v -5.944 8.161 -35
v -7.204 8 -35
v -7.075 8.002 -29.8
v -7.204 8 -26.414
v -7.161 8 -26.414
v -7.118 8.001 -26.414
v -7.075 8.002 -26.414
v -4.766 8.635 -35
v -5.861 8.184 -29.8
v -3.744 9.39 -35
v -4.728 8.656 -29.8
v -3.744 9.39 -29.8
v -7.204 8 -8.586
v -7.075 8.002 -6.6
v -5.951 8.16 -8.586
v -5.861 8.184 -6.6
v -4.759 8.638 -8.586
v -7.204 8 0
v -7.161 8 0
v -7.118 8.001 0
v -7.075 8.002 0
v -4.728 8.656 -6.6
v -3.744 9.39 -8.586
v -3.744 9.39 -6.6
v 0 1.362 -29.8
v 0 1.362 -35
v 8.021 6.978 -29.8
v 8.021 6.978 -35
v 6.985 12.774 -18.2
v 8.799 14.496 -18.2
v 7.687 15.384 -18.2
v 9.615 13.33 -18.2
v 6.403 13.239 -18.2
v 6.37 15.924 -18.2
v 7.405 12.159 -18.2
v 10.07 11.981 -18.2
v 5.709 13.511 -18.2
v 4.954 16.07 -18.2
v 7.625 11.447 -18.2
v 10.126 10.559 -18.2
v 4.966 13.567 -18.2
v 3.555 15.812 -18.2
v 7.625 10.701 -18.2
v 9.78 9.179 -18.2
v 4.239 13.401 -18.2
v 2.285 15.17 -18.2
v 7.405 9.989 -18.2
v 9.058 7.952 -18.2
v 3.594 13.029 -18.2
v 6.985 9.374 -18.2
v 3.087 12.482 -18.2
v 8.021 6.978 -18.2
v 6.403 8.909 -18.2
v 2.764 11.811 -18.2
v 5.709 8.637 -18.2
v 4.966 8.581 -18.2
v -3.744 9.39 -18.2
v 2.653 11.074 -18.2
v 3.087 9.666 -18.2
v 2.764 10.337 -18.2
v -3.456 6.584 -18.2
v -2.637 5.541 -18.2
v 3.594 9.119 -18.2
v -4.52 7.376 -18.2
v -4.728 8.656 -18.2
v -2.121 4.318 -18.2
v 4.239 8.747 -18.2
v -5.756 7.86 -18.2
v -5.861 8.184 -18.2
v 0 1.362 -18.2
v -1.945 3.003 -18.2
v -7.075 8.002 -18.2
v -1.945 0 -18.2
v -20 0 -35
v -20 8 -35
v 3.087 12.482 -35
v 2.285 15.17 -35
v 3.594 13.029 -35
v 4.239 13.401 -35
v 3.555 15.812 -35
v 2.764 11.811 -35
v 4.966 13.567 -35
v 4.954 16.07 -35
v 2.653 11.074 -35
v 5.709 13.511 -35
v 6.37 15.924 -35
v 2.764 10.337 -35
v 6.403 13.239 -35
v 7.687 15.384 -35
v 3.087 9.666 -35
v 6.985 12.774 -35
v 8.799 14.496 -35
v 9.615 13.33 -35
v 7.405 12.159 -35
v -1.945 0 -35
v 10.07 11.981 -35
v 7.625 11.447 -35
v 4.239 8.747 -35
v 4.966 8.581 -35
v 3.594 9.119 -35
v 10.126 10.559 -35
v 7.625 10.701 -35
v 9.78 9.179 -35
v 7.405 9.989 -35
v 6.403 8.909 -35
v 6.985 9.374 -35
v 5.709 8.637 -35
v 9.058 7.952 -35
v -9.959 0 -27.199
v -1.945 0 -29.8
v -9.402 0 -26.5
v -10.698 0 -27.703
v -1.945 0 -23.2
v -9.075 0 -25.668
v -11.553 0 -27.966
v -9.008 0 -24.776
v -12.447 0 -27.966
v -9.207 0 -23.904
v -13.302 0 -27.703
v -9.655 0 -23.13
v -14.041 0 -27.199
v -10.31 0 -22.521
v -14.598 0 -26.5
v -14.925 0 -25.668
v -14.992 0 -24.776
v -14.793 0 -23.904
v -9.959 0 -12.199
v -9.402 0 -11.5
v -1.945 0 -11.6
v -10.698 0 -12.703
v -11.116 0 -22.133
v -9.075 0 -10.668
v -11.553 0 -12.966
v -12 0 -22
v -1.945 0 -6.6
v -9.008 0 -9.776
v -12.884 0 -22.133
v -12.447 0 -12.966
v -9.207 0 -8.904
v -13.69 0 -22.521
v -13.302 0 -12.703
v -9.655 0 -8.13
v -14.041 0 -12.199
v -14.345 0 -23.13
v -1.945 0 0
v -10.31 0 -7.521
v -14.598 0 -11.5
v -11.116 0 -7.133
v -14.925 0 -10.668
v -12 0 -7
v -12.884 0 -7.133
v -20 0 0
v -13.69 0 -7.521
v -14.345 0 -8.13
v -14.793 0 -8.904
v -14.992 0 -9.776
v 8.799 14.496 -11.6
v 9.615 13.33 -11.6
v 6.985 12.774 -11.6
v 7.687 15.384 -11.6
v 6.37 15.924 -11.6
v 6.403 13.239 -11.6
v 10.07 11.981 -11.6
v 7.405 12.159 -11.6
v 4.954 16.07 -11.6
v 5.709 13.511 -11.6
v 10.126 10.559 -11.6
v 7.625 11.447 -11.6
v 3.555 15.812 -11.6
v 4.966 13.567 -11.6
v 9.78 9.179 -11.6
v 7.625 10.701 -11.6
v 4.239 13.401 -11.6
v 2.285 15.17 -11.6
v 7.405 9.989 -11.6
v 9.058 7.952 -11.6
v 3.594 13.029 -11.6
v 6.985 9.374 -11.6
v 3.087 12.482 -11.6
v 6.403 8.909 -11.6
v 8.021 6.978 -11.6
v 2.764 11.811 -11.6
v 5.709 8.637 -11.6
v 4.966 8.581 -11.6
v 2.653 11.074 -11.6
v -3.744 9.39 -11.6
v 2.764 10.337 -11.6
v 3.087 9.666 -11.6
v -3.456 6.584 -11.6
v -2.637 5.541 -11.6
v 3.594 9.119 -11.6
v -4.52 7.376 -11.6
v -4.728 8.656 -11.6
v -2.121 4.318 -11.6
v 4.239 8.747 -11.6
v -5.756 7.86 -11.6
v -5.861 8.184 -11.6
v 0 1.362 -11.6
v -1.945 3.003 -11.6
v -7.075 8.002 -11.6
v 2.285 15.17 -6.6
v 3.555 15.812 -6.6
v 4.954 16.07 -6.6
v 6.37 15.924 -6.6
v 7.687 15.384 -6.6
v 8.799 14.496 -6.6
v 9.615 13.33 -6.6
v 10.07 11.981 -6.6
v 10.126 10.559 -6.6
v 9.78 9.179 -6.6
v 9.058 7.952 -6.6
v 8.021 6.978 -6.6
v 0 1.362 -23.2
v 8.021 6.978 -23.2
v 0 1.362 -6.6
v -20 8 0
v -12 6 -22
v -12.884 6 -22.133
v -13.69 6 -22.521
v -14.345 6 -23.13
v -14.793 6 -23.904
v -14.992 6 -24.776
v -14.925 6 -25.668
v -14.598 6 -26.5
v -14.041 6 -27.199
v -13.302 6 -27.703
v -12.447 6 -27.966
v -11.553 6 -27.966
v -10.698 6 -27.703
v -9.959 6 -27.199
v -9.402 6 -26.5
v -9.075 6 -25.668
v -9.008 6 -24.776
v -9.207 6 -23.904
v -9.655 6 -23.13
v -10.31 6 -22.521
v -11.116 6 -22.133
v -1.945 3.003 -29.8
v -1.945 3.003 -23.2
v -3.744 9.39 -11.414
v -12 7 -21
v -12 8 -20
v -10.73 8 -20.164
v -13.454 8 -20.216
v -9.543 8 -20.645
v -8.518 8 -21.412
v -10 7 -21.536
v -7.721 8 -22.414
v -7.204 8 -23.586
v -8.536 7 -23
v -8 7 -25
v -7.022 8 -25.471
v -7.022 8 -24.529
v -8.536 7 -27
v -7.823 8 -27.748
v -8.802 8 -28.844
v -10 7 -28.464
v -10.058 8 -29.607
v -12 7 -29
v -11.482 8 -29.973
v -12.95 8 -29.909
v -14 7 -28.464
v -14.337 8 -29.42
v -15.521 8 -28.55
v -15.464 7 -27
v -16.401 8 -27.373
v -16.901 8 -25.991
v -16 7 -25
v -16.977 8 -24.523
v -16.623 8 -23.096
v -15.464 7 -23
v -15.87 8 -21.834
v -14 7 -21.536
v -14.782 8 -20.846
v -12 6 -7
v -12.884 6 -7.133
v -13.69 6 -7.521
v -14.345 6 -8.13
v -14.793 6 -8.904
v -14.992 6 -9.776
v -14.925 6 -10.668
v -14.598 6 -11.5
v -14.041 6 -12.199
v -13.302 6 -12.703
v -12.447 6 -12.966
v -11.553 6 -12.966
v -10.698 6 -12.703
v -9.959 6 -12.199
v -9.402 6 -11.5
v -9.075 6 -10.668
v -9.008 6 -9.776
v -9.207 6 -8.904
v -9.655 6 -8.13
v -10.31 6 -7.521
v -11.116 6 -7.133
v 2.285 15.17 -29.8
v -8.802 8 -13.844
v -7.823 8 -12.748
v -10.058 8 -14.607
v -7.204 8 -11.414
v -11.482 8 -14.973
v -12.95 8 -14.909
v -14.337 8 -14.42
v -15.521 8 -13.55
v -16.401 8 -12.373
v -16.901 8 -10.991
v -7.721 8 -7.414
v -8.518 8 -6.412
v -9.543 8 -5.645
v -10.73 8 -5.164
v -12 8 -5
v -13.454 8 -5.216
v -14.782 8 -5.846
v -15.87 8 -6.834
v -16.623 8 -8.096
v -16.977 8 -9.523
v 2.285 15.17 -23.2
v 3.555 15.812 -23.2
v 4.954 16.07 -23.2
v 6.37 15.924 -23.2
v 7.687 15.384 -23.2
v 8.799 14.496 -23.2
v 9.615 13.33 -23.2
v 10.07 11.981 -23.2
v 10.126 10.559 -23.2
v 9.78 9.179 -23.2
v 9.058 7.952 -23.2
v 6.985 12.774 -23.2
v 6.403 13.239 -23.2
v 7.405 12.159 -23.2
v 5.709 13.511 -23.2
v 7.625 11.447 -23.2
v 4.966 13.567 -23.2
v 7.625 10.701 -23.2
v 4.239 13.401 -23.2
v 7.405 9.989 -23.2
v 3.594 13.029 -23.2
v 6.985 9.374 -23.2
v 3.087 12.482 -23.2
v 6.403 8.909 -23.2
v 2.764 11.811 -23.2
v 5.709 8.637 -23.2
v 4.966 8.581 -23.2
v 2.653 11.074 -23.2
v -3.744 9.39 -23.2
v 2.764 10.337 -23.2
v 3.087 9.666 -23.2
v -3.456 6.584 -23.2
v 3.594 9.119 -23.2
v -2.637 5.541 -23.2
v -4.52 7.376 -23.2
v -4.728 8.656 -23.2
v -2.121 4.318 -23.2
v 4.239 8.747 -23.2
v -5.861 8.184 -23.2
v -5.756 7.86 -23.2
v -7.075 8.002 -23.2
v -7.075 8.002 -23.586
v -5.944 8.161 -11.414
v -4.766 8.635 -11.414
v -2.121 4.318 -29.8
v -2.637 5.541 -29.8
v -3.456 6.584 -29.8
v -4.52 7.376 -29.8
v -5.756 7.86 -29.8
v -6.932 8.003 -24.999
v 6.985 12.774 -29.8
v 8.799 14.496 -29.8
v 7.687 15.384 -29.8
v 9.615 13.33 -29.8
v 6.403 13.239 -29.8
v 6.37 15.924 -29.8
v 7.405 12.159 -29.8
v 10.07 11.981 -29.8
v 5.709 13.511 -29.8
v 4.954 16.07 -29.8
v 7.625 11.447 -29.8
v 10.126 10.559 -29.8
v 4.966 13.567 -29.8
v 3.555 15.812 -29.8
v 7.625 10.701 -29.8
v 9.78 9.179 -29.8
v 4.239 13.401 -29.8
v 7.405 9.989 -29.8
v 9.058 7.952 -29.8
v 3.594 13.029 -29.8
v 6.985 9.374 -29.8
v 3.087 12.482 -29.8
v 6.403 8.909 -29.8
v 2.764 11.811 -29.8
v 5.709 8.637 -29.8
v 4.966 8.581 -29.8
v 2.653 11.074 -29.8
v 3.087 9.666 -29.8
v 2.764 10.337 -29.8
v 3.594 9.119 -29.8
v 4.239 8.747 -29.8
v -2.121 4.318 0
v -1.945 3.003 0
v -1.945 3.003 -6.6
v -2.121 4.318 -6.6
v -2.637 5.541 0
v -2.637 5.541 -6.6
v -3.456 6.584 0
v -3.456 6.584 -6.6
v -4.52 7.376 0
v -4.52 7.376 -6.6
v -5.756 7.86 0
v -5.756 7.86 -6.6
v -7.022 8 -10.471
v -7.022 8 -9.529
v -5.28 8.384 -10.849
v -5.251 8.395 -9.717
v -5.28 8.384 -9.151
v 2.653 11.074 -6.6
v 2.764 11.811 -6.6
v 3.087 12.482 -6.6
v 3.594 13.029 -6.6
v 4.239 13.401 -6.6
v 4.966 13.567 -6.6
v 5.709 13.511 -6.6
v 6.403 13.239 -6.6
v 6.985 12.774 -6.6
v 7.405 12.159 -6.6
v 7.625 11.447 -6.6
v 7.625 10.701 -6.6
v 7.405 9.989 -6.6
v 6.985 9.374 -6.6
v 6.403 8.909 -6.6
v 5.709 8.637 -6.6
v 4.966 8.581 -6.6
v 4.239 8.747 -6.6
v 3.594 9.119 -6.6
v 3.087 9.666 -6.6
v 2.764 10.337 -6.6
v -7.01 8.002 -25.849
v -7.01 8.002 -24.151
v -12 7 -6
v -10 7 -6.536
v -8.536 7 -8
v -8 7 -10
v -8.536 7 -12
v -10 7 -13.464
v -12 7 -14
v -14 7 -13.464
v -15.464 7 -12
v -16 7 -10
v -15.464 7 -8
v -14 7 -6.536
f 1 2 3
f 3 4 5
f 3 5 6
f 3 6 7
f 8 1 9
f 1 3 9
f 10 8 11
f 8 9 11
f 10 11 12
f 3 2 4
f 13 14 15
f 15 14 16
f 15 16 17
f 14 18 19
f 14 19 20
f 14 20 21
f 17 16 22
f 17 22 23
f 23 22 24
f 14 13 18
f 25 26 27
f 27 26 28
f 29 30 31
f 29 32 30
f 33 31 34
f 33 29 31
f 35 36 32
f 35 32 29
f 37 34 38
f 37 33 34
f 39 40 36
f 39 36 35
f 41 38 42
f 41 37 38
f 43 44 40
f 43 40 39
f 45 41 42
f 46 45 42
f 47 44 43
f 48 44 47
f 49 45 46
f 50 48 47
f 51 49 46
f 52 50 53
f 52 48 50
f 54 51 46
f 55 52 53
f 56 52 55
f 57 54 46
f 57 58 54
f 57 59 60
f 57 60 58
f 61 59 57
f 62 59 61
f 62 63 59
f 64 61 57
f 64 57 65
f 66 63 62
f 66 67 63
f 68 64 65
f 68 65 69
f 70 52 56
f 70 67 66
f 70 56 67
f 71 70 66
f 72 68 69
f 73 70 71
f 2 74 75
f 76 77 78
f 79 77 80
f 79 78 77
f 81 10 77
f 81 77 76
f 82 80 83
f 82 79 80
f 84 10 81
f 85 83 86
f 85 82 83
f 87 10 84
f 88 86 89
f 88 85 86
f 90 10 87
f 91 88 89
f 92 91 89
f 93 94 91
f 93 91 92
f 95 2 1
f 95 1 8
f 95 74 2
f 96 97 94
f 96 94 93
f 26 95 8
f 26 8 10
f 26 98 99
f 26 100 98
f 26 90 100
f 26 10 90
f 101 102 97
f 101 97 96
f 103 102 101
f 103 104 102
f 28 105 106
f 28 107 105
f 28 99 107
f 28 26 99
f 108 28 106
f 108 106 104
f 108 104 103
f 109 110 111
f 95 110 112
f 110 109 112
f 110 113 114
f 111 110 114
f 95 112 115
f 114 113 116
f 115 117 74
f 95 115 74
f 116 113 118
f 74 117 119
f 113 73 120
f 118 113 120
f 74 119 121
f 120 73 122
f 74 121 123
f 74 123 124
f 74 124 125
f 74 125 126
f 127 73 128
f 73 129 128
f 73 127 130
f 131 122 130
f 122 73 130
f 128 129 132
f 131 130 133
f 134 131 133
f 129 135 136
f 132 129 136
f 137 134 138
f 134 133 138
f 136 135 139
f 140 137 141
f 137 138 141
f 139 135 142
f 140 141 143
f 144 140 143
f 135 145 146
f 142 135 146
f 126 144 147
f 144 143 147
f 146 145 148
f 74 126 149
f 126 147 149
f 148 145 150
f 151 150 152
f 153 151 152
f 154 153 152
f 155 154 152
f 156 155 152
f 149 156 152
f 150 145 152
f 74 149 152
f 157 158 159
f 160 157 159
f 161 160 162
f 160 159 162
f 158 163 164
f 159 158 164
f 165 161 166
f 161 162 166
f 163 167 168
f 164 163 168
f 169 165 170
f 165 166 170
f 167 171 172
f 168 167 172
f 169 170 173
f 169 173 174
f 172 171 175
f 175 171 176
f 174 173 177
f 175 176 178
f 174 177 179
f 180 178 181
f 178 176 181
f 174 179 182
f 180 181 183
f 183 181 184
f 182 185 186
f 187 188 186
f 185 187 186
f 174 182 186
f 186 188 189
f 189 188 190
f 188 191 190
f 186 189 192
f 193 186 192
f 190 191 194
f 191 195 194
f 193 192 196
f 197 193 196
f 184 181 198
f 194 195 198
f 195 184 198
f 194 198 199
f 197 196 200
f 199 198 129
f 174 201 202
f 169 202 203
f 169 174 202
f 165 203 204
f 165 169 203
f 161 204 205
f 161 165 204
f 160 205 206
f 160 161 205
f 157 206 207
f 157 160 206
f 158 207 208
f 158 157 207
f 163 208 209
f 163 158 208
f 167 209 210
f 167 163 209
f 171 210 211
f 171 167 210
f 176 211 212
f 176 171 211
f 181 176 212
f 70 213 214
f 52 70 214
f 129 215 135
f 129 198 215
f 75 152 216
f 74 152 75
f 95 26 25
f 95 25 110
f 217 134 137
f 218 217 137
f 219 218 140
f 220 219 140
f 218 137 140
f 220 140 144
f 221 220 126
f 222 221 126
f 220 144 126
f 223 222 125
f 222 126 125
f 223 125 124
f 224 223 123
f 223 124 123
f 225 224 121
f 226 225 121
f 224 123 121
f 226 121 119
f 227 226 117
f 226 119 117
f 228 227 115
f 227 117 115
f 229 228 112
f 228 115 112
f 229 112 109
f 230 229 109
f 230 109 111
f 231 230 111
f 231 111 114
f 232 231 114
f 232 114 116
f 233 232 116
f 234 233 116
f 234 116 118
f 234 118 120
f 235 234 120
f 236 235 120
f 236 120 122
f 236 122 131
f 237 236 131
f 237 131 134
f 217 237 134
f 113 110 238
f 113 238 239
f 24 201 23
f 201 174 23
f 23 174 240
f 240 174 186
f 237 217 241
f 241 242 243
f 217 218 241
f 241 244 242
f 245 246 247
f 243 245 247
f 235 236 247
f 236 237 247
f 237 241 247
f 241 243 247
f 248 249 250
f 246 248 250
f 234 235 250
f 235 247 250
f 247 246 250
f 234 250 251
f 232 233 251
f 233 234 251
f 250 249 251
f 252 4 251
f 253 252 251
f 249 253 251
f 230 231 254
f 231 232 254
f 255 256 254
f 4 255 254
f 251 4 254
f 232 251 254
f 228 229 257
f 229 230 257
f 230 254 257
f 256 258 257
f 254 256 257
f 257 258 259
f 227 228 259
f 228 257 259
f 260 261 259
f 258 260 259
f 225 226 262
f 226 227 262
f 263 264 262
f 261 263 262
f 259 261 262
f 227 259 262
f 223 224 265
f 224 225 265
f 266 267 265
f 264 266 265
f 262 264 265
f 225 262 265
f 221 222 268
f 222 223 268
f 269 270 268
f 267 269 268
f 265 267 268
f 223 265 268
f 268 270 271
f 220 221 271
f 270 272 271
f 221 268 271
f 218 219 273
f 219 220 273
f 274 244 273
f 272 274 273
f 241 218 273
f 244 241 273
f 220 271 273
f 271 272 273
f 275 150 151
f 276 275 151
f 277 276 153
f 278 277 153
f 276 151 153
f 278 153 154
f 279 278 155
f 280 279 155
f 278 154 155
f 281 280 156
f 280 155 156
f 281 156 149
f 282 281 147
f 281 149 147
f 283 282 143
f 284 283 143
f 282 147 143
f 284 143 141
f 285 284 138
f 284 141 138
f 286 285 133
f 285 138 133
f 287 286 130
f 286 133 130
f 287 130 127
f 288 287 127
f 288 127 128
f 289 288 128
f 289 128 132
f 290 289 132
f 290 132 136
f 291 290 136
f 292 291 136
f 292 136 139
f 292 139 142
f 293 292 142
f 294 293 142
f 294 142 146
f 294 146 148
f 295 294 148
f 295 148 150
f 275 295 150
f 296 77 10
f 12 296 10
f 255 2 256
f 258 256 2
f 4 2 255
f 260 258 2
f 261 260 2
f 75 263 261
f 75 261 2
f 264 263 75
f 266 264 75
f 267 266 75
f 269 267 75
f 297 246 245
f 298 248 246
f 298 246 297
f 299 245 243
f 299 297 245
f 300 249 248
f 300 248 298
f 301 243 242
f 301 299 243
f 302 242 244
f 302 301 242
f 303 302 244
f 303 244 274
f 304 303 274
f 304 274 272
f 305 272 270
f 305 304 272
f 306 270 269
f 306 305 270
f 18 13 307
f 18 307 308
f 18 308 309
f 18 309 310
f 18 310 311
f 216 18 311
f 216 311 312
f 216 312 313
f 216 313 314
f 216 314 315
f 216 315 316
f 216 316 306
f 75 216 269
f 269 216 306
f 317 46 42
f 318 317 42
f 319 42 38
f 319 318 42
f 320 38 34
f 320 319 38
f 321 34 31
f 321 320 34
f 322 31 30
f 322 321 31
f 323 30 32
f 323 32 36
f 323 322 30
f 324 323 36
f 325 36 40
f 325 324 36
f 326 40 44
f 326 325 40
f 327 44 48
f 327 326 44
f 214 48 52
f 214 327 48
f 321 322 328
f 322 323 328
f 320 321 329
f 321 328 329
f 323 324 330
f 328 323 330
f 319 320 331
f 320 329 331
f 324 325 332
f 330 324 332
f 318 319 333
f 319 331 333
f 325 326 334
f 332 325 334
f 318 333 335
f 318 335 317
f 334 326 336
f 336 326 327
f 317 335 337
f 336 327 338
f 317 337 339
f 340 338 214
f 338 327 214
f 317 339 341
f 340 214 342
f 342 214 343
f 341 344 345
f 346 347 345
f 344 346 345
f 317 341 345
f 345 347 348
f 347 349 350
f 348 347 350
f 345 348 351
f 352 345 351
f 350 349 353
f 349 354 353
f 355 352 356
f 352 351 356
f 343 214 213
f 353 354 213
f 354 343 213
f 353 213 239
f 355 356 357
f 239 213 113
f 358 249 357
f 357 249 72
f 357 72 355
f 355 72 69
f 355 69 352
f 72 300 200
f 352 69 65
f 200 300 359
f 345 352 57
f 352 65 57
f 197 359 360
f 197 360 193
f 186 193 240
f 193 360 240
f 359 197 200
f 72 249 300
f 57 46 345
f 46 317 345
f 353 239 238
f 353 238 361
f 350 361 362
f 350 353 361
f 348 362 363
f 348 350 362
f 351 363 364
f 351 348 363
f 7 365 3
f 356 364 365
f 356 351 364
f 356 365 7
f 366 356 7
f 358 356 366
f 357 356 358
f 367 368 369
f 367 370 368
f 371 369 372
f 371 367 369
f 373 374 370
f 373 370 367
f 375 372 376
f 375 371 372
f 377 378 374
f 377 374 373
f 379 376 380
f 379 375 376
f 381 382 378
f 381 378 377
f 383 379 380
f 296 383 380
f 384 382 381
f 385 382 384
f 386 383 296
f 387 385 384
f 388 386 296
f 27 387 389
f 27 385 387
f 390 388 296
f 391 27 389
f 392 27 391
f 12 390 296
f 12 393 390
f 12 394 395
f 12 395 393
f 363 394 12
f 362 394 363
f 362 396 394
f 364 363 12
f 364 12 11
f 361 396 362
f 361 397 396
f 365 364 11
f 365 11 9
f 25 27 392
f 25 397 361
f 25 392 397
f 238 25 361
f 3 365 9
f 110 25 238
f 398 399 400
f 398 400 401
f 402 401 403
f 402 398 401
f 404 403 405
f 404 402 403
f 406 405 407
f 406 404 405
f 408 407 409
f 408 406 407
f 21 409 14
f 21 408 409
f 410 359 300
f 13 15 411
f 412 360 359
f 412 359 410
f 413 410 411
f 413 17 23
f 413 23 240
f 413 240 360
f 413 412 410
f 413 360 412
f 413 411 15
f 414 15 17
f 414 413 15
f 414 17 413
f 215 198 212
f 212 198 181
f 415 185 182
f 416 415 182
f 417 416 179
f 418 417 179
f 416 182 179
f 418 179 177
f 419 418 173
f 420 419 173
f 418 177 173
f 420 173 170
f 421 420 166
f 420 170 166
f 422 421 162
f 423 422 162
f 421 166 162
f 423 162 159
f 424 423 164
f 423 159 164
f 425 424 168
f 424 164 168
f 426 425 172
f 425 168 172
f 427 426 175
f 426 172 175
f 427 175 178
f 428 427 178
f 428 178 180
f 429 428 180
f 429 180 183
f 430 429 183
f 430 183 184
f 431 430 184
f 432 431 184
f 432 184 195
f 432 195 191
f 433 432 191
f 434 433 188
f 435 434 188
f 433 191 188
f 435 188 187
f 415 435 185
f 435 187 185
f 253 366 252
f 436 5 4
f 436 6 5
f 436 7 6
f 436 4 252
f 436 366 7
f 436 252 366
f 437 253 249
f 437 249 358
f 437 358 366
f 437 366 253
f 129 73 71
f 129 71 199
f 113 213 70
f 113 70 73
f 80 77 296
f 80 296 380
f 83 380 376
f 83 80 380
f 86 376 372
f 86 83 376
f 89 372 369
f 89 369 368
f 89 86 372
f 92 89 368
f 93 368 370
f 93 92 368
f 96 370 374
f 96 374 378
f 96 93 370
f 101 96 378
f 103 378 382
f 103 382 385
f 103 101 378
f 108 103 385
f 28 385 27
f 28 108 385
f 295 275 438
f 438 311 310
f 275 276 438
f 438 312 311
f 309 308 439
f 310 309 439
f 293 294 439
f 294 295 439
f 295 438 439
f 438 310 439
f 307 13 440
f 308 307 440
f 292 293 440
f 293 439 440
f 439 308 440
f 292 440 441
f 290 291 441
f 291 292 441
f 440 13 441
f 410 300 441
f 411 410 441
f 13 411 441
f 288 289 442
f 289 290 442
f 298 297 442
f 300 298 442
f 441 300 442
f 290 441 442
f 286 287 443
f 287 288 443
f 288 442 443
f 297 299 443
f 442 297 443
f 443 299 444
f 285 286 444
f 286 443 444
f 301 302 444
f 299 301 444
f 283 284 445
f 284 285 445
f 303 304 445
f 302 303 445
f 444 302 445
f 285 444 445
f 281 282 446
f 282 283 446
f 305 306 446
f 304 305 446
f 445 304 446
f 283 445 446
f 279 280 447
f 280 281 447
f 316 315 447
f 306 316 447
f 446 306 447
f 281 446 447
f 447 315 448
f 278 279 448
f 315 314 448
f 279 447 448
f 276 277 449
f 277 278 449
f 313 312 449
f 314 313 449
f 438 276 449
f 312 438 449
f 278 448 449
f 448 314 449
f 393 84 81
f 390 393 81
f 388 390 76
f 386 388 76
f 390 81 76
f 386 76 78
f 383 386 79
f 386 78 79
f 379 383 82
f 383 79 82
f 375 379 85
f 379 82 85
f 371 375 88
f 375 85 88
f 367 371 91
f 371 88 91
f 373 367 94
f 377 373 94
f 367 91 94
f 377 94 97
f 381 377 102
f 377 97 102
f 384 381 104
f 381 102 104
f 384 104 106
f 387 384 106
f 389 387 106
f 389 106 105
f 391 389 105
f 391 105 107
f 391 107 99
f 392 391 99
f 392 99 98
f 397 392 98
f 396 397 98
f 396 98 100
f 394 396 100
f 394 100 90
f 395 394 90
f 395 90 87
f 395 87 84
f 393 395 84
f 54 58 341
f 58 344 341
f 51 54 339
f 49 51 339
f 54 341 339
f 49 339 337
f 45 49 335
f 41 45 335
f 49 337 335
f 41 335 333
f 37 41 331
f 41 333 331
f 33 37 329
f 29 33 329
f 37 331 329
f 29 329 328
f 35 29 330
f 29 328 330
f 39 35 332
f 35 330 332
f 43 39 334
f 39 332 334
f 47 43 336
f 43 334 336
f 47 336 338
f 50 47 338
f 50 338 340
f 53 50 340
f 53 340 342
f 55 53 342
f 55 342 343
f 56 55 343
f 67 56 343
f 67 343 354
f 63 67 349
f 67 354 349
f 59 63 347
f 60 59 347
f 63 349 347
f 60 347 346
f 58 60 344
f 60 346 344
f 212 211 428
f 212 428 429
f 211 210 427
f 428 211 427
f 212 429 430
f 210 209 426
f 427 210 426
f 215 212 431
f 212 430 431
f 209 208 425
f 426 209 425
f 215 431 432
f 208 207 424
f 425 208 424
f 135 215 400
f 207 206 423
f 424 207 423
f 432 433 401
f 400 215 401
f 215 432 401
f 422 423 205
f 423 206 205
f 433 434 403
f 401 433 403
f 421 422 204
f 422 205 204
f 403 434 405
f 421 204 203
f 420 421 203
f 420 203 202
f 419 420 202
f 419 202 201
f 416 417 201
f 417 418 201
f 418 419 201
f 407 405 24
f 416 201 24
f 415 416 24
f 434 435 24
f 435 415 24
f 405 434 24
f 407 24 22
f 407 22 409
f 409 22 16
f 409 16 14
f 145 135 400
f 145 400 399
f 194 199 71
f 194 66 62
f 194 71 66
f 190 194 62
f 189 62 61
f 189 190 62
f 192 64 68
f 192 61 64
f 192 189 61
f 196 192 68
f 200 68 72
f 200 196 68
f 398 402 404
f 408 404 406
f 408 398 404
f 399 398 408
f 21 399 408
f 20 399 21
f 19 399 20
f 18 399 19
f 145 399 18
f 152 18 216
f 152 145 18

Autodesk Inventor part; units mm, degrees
ref_plane "YZ Plane" through (0, 0, 0) normal (1, 0, 0) x (0, 1, 0)
ref_plane "XZ Plane" through (0, 0, 0) normal (0, 1, 0) x (-1, 0, 0)
ref_plane "XY Plane" through (0, 0, 0) normal (0, 0, 1) x (1, 0, 0)
sketch "Sketch2" plane through (0, 0, 0) normal (0, 1, 0) x (-1, 0, 0)
  line L0 (0, 0) -> (20, 0)
  line L1 (20, 0) -> (20, -35)
  line L2 (20, -35) -> (0, -35)
  line L3 (0, -35) -> (0, 0)
  dimension "d0" = 35
  dimension "d1" = 20
extrude "Extrusion1" add sketch "Sketch2" along normal blind 8
sketch "Sketch3" plane through (0, 0, -35) normal (0, 0, -1) x (-1, 0, 0)
  line L0 (0, 0) -> (20, 0) projected
  line L1 (1.9454, 0) -> (-8.0206, 6.9783)
  line L2 (-8.0206, 6.9783) -> (-2.2848, 15.1698) construction
  line L3 (-2.2848, 15.1698) -> (7.9547, 8)
  line L4 (0, 8) -> (20, 8) projected
  arc A0 (-2.2848, 15.1698) -> (-8.0206, 6.9783) centre (-5.1527, 11.074) ccw
  circle A1 centre (-5.1527, 11.074) radius 2.5
  line L5 (0, 0) -> (0, 8) construction
  line L6 (-5.1527, 11.074) -> (0, 8) construction
  line L7 (1.9454, 0) -> (7.9547, 8)
  line L8 (-2.2848, 15.1698) -> (6.7994, 6.4619)
  dimension "d4" = 5
  dimension "d5" = 10
  dimension "d6" = 6
  dimension "d21" = 35
extrude "Extrusion2" add sketch "Sketch3" against normal up to surface (35 mm away) contours L1 A0 L8 L7
sketch "Sketch4" plane through (0, 0, -35) normal (0, 0, -1) x (-1, 0, 0)
  line L0 (-8.0206, 6.9783) -> (0, 1.3622) projected
  line L1 (-4.533, 4.5362) -> (4.5811, -1.8456)
  line L2 (4.5811, -1.8456) -> (-4.9445, -1.8456)
  line L3 (-4.9445, -1.8456) -> (-4.533, 4.5362)
  point P0 (0, 0)
  point P1 (0, 1.3622)
extrude "Extrusion3" cut sketch "Sketch4" against normal up to next
sketch "Sketch5" plane through (0, 8, 0) normal (0, 1, 0) x (1, 0, 0)
  line L0 (-5.1948, 35) -> (-20, 35) construction
  line L1 (-12, 35) -> (-12, 25) construction
  line L2 (-12, 25) -> (-12, 10) construction
  line L3 (-20, 35) -> (-20, 0) construction
  point P0 (0, 0)
  point P1 (-7.9547, 35)
  dimension "d11" = 10
  dimension "d12" = 15
  dimension "d13" = 8
hole "Hole1" at (-12, 8, -25) at (-12, 8, -10) direction (0, -1, 0) diameter 6 end through all countersink diameter 10 countersink angle 90
fillet "Fillet1" radius 5 1 edges at (-5.1948, 8, -17.5)
sketch "Sketch6" plane through (0, 0, 0) normal (0, -1, 0) x (1, 0, 0)
  line L0 (8.0206, 0) -> (-1.9454, 0) projected
  line L1 (-1.9454, 0) -> (16.0794, 0)
  line L2 (16.0794, 0) -> (16.0794, -6.6)
  line L3 (16.0794, -6.6) -> (-1.9454, -6.6)
  line L4 (-1.9454, -6.6) -> (-1.9454, 0)
  point P0 (0, 0)
  dimension "d23" = 6.6
extrude "Extrusion4" cut sketch "Sketch6" against normal up to next
fillet "Fillet2" radius 5 1 edges at (-1.9454, 11.1148, -3.3)
pattern_linear "Rectangular Pattern1" count 3 spacing 11.6 along (0, 0, -1) of "Extrusion4", "Fillet2"
properties part number "halfhinge"
